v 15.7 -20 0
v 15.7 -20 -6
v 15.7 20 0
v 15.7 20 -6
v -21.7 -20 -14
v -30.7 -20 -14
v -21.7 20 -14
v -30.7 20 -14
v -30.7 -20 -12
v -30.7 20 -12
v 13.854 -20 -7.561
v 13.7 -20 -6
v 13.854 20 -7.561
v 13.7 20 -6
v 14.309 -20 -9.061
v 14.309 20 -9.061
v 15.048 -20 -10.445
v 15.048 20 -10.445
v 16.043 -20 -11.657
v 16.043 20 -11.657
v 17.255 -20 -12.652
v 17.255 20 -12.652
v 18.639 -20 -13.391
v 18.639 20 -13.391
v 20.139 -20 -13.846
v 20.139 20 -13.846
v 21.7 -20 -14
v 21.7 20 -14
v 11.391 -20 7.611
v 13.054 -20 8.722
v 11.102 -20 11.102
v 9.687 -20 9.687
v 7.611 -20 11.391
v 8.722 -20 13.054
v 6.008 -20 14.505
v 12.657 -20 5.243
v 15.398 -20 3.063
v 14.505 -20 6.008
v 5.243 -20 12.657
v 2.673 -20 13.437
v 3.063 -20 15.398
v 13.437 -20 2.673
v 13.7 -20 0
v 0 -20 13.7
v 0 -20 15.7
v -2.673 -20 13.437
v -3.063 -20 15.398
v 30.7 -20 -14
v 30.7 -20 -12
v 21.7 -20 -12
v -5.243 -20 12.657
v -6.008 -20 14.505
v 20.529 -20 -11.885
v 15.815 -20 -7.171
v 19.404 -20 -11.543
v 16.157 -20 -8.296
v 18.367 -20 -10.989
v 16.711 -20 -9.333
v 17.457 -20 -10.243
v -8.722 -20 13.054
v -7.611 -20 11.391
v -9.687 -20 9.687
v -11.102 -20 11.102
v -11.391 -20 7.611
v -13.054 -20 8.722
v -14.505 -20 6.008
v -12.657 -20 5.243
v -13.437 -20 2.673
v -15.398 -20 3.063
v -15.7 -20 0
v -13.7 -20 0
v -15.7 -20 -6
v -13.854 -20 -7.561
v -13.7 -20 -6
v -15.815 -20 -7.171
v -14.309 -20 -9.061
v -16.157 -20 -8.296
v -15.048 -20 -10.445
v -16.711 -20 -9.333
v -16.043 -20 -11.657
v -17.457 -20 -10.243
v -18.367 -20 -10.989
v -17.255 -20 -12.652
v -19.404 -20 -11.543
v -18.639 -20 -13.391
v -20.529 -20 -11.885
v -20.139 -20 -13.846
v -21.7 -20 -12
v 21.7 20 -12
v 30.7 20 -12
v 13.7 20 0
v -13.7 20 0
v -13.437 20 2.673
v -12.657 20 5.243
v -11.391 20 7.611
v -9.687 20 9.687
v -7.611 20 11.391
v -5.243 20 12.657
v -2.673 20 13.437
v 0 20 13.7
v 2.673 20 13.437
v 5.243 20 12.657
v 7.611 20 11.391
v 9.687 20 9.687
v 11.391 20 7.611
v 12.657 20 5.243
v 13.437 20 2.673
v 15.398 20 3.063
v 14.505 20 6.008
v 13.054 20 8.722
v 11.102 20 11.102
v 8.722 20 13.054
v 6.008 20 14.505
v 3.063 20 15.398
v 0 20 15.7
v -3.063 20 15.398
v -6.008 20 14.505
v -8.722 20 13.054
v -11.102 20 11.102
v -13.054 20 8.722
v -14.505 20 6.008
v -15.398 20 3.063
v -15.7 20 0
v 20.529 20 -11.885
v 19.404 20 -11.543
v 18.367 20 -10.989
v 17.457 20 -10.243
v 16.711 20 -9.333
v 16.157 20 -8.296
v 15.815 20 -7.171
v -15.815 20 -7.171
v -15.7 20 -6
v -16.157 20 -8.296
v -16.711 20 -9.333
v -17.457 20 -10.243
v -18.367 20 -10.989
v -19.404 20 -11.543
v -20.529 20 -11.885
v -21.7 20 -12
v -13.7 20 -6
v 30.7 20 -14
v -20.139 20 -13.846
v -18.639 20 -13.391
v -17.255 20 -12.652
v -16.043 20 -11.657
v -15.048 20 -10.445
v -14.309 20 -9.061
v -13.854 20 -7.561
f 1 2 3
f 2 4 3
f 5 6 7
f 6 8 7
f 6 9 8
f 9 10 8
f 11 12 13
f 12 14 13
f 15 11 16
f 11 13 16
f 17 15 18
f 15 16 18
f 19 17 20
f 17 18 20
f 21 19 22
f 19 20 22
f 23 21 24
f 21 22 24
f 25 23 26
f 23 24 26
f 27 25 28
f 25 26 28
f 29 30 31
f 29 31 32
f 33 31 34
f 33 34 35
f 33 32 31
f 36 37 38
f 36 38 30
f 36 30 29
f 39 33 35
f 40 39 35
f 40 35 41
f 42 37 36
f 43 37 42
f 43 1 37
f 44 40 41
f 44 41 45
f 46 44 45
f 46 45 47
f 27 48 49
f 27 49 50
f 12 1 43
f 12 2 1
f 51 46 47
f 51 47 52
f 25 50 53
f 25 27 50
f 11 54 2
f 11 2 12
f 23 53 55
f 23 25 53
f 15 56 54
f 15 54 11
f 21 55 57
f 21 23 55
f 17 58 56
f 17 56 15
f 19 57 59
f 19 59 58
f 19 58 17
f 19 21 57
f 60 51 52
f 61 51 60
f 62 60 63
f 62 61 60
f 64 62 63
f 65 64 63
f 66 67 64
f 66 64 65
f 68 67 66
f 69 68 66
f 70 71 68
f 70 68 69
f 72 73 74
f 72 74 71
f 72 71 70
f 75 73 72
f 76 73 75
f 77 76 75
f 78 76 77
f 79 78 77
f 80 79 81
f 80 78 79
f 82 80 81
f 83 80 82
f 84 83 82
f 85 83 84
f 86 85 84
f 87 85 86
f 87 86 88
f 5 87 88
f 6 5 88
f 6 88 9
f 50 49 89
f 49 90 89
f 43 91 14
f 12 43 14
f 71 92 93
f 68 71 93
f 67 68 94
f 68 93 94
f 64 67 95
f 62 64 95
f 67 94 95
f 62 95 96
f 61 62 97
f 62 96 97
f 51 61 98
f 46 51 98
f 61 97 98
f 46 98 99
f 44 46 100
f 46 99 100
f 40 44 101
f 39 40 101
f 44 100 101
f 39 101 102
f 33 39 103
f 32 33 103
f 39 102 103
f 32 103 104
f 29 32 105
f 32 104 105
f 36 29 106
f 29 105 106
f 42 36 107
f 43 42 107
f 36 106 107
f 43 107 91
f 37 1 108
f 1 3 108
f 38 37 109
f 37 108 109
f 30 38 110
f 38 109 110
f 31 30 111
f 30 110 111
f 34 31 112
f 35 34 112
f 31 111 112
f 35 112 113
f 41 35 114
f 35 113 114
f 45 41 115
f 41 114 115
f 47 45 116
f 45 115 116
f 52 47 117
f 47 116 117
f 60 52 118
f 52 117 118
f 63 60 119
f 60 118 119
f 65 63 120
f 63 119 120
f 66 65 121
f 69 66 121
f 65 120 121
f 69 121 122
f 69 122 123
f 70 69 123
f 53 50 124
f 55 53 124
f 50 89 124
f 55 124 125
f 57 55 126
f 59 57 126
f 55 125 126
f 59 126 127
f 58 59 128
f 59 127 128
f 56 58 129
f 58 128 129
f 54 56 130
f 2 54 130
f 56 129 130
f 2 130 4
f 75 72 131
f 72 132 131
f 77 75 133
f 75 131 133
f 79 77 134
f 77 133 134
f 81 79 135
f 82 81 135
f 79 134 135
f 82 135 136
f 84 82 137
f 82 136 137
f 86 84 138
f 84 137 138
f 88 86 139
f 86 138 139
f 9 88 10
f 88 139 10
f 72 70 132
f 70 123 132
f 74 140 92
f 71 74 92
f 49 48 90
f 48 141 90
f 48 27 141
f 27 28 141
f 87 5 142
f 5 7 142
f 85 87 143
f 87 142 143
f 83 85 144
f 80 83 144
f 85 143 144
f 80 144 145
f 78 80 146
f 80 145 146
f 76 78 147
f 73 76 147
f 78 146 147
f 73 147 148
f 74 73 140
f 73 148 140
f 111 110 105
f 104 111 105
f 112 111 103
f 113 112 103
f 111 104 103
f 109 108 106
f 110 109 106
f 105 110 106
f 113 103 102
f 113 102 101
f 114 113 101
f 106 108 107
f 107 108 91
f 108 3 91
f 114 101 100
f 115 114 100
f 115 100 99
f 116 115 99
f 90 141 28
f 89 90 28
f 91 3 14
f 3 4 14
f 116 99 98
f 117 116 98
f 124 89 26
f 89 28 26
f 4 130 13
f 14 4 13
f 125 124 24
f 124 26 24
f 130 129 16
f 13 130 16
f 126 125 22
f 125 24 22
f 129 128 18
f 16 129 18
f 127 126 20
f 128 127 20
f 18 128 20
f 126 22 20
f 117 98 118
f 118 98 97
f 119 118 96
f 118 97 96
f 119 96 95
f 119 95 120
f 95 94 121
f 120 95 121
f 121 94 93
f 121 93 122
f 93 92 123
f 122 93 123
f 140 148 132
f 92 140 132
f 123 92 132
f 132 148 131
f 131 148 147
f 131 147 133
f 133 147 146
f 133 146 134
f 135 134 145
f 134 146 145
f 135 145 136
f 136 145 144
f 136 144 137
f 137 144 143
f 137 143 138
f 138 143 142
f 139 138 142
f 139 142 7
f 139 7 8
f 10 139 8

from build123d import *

# Parameters (mm, degrees)
BOSS_EXTRUDE1_DEPTH = 20


with BuildPart() as part:
    # Sketch1 → Boss-Extrude1 (new, symmetric)
    with BuildSketch(Plane(origin=(0, 0, 0), x_dir=(1, 0, 0), z_dir=(0, 1, 0))):
        with BuildLine():
            Line((13.7, 0), (13.7, 6))
            ThreePointArc((13.7, 6), (16.043145751, 11.656854249), (21.7, 14))
            Line((21.7, 14), (30.7, 14))
            Line((30.7, 14), (30.7, 12))
            Line((30.7, 12), (21.7, 12))
            ThreePointArc((21.7, 12), (17.457359313, 10.242640687), (15.7, 6))
            Line((15.7, 6), (15.7, 0))
            ThreePointArc((15.7, 0), (0, -15.7), (-15.7, 0))
            Line((-15.7, 0), (-15.7, 6))
            ThreePointArc((-15.7, 6), (-17.457359313, 10.242640687), (-21.7, 12))
            Line((-21.7, 12), (-30.7, 12))
            Line((-30.7, 12), (-30.7, 14))
            Line((-30.7, 14), (-21.7, 14))
            ThreePointArc((-21.7, 14), (-16.043145751, 11.656854249), (-13.7, 6))
            Line((-13.7, 6), (-13.7, 0))
            ThreePointArc((-13.7, 0), (0, -13.7), (13.7, 0))
        make_face()
    extrude(amount=BOSS_EXTRUDE1_DEPTH, both=True)


solid = part.part
